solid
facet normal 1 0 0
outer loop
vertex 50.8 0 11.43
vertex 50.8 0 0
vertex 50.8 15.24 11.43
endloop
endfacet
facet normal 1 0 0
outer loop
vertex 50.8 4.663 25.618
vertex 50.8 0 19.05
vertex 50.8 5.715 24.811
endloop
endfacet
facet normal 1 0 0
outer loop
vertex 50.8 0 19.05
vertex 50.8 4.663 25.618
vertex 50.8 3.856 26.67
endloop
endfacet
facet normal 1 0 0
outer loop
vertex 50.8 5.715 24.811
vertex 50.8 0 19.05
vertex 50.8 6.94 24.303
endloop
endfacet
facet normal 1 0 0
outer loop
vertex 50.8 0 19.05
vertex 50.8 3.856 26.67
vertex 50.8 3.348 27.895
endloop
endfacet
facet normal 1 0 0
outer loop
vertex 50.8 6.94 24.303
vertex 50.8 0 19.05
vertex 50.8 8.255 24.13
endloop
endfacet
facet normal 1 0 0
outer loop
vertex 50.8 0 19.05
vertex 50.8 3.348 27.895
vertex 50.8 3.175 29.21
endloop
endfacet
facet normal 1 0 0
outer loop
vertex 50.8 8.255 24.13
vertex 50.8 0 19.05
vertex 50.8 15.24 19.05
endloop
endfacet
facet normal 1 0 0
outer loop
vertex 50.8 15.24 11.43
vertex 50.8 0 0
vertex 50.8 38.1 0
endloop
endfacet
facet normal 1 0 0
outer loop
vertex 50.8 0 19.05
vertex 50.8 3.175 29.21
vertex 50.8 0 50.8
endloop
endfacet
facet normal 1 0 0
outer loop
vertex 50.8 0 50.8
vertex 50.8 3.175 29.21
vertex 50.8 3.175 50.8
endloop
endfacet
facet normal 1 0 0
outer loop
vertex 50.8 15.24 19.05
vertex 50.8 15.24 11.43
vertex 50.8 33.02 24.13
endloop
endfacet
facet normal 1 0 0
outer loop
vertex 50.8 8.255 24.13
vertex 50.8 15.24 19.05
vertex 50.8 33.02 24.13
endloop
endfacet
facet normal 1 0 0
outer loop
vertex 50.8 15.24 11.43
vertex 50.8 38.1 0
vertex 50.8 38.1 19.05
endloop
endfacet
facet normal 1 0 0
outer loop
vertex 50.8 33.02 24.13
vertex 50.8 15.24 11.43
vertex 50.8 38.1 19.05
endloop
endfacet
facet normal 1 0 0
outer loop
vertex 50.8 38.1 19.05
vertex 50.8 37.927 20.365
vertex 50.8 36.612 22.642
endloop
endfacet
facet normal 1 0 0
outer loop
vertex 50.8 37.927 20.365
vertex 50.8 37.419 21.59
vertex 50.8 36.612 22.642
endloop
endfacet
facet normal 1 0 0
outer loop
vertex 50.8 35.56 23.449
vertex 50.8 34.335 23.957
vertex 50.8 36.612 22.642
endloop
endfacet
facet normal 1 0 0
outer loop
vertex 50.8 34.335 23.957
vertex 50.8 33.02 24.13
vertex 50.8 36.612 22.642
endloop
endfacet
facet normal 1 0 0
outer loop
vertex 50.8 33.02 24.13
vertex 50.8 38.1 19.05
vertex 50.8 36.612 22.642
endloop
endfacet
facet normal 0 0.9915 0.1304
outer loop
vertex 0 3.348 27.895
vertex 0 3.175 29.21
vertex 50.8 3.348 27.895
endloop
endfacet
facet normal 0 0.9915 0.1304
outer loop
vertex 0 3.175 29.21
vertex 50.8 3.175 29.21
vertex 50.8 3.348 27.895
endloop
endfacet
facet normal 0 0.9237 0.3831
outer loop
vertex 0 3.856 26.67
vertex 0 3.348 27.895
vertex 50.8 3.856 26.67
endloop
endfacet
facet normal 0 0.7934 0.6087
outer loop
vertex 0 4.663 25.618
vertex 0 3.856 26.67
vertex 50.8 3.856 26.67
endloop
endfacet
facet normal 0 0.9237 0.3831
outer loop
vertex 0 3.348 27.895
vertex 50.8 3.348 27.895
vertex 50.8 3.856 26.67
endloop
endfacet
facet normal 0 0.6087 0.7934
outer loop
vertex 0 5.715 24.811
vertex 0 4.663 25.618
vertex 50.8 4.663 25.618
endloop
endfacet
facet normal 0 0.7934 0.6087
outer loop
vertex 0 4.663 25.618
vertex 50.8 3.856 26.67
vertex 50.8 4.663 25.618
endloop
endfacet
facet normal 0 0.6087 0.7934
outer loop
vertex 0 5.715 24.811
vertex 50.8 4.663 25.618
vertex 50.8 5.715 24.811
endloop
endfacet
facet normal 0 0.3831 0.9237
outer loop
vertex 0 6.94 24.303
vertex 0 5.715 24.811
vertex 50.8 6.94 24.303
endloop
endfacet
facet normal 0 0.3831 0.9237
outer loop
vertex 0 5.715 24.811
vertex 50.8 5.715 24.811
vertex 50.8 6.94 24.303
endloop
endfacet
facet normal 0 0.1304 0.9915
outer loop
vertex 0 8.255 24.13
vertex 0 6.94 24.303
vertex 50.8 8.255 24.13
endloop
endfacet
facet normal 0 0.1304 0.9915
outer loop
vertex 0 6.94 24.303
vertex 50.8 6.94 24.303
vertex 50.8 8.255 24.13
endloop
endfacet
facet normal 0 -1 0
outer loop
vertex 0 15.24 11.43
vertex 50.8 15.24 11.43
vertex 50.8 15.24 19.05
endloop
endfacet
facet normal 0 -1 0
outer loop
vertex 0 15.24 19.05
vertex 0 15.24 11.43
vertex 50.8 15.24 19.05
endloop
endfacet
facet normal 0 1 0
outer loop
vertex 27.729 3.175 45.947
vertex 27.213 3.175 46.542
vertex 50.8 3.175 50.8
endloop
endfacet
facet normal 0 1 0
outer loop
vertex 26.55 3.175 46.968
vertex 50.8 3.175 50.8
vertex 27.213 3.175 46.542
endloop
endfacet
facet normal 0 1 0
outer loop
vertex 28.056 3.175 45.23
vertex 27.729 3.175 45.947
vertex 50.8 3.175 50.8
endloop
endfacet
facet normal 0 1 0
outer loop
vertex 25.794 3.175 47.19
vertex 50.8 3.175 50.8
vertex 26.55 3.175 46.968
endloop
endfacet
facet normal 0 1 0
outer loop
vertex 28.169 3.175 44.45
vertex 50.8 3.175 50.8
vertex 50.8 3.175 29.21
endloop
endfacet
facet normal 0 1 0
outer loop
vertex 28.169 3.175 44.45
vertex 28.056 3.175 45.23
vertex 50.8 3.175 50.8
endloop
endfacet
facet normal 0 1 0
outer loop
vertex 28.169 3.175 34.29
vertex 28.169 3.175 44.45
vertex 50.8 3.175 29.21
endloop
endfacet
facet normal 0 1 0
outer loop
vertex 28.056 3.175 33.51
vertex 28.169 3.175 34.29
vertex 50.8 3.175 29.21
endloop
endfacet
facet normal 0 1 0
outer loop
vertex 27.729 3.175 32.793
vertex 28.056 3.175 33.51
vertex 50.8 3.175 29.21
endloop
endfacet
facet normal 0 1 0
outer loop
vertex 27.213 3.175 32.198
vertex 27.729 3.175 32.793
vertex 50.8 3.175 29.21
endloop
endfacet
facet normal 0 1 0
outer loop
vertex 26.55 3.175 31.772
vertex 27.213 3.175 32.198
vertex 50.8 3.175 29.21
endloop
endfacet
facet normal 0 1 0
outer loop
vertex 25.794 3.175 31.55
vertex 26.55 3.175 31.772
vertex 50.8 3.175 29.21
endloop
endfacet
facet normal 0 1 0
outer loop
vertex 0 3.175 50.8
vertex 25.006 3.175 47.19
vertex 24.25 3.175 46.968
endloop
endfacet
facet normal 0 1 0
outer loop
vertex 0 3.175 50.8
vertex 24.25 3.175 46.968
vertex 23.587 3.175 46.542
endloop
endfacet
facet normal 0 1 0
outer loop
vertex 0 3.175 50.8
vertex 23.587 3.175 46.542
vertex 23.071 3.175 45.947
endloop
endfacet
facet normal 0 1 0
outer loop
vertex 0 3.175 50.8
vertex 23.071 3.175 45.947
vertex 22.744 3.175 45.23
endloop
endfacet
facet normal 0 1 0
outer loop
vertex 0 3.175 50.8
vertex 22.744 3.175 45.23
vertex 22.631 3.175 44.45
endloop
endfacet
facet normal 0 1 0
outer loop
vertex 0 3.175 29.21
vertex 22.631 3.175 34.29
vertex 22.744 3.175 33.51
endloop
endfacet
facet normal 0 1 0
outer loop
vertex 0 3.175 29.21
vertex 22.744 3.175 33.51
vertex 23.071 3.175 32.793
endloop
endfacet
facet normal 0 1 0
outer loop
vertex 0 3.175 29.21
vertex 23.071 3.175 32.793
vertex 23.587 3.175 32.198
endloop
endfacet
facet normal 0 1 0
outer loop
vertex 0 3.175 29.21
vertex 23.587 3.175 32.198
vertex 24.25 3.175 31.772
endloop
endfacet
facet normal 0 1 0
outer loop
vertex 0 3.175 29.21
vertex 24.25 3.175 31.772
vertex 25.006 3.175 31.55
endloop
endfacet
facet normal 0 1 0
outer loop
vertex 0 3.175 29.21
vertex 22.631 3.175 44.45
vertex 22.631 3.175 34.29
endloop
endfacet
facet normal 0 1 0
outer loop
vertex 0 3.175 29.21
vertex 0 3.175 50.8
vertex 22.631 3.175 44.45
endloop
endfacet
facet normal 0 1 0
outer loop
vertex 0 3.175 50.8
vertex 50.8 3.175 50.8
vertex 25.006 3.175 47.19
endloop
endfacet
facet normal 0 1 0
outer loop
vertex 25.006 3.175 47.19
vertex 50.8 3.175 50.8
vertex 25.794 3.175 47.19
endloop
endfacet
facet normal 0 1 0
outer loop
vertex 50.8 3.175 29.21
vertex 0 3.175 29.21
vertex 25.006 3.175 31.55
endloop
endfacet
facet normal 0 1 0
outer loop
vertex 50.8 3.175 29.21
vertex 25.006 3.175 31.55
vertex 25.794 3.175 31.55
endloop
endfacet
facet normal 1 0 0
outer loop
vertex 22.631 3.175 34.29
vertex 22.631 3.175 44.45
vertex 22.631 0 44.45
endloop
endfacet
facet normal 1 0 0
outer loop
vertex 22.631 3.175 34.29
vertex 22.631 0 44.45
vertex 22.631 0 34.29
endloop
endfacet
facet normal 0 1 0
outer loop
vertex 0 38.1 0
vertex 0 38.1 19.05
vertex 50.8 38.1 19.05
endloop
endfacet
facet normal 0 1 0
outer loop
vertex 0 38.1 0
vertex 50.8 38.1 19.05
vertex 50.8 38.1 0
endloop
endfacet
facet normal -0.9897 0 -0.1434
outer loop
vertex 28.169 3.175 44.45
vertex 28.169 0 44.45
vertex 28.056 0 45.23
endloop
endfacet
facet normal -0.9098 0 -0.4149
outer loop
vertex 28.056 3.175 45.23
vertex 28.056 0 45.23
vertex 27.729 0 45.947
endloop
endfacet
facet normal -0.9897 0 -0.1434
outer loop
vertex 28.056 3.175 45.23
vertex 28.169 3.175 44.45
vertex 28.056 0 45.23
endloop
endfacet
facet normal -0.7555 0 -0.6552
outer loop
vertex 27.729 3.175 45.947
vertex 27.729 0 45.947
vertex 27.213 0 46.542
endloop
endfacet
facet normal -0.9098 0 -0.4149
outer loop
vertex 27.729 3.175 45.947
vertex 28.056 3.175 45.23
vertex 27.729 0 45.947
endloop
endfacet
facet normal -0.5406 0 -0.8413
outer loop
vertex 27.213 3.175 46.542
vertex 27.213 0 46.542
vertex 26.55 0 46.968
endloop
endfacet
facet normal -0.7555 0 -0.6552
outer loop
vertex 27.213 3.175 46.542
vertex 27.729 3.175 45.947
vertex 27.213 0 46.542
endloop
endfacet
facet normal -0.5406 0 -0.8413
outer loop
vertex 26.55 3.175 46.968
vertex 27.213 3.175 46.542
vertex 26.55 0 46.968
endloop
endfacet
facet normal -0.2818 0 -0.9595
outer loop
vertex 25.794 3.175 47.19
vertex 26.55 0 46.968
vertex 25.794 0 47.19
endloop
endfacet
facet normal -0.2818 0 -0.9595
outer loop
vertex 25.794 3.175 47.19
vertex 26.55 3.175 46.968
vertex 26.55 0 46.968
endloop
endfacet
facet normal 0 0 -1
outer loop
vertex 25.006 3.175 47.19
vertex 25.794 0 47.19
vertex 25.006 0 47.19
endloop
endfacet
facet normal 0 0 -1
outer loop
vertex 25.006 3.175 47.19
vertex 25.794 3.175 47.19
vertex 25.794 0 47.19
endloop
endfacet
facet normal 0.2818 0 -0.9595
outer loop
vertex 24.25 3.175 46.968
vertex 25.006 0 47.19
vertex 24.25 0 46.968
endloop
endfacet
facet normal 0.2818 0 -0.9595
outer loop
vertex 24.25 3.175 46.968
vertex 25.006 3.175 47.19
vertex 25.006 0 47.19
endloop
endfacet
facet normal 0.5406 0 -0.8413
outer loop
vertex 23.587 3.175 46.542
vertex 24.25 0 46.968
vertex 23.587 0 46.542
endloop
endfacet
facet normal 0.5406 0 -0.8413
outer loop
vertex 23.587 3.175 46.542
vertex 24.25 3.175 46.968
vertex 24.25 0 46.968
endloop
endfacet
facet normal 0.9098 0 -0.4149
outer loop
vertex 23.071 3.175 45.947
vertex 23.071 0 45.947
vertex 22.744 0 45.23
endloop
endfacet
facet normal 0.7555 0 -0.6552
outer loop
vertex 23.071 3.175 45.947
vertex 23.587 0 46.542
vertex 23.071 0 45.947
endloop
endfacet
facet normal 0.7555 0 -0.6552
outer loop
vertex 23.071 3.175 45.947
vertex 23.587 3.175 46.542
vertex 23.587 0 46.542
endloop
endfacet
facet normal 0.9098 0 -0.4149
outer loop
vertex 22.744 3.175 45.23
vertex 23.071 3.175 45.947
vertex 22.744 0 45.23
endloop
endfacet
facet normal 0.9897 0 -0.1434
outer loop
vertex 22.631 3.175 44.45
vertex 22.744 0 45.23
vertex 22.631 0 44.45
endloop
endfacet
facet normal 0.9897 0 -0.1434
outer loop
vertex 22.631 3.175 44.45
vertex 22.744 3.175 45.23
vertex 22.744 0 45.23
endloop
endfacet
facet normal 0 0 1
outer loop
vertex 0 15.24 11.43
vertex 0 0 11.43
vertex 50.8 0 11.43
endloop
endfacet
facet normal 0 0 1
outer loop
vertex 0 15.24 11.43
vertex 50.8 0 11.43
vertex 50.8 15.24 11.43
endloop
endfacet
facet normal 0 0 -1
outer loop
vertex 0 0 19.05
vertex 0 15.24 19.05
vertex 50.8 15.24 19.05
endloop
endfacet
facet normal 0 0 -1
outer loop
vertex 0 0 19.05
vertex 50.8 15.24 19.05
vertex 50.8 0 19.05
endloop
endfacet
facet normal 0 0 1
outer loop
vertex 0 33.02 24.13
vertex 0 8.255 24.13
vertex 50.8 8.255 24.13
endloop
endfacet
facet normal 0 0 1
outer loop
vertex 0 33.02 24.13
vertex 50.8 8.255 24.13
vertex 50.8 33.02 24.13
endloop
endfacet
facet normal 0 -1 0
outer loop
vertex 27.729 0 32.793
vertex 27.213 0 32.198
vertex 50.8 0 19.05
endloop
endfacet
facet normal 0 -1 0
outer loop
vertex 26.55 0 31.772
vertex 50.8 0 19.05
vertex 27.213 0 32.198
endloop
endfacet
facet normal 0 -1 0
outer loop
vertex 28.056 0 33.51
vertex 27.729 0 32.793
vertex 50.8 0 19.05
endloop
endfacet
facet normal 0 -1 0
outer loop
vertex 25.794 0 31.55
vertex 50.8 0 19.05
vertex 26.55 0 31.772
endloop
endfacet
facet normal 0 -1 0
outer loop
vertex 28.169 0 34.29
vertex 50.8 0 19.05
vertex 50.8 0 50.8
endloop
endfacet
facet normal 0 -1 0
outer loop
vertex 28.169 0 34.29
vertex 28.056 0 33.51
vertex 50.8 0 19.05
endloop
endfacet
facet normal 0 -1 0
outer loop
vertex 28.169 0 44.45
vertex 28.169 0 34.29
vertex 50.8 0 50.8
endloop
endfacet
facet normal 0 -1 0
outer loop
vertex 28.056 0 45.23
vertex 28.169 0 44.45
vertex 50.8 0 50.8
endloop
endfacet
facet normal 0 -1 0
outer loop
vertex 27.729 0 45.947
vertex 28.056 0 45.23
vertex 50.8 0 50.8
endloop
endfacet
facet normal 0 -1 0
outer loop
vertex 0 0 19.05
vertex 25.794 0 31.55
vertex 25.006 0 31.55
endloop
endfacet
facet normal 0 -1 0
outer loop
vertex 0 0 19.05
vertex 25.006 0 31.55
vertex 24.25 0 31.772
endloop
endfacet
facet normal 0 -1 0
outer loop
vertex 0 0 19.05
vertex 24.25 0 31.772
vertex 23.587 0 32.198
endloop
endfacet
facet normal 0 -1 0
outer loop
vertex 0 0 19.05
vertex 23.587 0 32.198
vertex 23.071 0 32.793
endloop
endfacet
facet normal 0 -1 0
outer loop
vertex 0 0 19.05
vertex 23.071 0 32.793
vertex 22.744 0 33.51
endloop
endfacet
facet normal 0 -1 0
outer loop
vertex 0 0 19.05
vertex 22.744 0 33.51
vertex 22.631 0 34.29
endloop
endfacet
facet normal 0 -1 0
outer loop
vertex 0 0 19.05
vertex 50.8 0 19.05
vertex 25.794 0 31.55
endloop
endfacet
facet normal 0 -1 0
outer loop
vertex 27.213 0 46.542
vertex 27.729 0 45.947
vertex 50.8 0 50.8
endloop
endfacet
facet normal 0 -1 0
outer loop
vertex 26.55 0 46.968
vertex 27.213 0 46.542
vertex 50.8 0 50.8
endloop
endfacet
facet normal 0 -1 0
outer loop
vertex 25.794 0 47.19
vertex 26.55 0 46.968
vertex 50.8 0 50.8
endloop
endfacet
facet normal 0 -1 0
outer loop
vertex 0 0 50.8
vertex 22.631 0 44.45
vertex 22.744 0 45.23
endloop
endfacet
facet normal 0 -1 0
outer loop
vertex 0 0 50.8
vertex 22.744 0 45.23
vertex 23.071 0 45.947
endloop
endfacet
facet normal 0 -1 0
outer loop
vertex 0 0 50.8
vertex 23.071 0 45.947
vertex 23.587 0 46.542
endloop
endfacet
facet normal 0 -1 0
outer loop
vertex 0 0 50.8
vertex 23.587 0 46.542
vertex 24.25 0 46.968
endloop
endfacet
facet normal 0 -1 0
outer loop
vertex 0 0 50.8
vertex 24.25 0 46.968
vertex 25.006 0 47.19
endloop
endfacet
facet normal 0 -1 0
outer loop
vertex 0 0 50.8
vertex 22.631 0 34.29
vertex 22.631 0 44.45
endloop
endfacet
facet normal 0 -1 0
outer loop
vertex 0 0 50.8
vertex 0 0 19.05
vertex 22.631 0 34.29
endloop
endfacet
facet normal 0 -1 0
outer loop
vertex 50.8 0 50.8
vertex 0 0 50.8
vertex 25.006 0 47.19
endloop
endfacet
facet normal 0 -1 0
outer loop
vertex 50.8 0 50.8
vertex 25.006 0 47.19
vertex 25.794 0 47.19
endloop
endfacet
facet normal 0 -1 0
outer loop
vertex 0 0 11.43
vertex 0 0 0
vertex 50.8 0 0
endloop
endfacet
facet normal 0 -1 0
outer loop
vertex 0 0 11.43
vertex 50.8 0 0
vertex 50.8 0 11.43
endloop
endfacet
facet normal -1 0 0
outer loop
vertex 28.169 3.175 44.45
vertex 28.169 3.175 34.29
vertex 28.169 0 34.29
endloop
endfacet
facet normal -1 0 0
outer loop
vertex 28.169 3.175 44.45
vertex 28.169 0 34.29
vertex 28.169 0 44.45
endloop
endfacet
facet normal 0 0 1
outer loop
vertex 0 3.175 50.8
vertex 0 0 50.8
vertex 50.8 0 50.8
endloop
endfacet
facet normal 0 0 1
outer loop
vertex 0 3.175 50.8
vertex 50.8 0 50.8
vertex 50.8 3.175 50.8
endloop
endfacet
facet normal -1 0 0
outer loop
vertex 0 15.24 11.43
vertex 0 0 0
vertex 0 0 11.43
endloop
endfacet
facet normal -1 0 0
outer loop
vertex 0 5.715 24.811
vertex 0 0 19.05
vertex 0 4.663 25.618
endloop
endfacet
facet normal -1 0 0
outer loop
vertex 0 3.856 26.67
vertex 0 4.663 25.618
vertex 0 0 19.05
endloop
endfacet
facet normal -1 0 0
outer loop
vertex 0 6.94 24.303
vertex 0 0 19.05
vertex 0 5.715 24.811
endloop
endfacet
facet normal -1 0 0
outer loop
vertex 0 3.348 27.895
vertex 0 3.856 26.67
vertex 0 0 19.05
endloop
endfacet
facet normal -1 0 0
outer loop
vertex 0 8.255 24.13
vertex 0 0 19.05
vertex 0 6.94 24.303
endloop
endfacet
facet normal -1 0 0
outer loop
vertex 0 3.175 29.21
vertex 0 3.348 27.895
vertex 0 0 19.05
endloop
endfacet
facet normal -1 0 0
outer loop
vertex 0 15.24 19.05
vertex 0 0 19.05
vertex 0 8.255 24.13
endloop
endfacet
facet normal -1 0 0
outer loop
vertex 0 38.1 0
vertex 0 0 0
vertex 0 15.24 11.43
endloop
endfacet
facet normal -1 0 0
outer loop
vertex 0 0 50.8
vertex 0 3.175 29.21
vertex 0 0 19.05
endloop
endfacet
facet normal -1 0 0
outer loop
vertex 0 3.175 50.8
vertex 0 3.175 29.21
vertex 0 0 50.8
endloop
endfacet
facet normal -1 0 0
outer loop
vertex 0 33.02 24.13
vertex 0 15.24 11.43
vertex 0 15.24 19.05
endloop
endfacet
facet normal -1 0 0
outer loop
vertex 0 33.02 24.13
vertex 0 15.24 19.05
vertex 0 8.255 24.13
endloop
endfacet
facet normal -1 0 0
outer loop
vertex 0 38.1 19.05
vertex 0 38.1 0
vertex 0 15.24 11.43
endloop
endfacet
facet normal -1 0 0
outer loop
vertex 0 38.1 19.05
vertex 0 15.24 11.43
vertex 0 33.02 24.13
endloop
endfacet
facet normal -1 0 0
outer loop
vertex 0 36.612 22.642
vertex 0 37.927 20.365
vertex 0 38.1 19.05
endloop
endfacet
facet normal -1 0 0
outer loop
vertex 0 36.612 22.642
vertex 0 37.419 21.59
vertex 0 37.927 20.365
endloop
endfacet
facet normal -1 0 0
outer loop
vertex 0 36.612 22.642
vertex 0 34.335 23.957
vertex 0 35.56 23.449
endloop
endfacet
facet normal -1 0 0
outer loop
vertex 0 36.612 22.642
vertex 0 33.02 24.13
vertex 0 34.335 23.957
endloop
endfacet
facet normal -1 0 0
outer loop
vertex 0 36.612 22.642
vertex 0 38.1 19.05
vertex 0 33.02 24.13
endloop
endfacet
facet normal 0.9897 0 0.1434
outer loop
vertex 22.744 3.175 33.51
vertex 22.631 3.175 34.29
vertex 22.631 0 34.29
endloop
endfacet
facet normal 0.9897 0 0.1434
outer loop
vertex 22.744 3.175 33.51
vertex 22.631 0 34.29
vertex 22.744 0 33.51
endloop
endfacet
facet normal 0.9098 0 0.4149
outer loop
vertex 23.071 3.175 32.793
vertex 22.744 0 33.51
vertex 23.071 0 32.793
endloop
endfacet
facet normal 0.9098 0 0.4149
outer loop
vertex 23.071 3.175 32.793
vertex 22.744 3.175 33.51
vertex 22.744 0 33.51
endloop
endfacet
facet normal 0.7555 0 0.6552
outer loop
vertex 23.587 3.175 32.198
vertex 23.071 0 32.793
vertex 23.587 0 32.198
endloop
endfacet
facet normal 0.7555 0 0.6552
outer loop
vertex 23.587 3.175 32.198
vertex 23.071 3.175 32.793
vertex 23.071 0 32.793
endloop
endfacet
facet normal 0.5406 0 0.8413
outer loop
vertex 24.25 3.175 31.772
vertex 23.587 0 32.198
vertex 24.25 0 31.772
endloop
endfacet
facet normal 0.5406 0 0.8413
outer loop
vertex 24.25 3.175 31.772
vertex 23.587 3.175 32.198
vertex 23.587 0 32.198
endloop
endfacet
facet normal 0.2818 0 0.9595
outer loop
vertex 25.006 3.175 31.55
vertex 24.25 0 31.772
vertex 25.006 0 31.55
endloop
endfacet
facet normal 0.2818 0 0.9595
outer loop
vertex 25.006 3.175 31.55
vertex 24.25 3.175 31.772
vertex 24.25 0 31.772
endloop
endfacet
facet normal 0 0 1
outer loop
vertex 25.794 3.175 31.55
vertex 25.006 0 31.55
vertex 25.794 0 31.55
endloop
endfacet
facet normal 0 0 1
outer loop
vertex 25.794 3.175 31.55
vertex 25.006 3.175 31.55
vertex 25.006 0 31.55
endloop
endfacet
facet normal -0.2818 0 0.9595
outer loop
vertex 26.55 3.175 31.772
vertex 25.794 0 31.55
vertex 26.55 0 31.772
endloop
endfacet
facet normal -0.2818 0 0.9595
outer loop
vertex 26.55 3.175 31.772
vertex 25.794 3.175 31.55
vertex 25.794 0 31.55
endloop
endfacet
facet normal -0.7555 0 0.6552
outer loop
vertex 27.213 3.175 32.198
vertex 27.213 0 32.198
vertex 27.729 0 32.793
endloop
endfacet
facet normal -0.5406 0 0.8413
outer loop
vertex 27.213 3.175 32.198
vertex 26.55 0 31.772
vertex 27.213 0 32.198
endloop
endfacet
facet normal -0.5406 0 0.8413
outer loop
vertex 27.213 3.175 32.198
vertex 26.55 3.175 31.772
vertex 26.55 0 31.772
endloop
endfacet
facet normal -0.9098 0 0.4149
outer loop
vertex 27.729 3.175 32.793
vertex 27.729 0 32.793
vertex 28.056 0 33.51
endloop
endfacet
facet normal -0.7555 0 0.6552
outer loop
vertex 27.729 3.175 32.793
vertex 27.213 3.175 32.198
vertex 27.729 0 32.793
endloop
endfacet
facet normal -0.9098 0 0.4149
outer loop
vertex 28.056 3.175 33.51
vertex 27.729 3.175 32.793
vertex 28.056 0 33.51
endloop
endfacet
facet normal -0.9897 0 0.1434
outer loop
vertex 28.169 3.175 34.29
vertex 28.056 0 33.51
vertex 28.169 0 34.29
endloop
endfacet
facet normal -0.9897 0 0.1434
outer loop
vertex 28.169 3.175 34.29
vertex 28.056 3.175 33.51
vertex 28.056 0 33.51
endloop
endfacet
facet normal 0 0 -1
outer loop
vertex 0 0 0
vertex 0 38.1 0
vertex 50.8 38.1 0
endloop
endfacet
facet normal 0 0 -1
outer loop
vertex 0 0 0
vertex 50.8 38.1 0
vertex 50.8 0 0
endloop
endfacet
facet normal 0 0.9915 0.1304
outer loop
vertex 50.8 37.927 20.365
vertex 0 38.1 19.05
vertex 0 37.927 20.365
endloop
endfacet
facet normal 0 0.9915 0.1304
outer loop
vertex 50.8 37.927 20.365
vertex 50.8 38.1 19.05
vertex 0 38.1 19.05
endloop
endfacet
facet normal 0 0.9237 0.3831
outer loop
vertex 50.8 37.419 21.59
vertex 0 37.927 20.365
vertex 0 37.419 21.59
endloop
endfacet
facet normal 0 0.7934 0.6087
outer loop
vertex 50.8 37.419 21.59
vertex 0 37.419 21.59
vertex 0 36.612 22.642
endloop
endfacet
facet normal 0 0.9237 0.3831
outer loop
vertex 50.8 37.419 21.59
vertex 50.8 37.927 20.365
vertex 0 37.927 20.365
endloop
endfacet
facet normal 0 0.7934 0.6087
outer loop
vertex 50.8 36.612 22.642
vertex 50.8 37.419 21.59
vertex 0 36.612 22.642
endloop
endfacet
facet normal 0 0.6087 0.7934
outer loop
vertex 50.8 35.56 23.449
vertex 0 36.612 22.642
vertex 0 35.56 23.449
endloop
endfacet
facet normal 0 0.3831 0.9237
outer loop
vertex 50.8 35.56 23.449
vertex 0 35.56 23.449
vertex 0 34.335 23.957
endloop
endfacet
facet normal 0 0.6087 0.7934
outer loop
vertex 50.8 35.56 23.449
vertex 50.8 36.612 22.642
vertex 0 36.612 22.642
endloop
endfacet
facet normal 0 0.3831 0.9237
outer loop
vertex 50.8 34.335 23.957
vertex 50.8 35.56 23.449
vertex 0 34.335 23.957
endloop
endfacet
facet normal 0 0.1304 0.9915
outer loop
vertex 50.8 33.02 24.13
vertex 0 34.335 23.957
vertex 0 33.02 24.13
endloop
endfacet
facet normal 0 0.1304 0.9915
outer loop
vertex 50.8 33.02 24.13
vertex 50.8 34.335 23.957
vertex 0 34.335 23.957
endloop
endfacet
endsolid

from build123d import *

# Parameters (mm, degrees)
BOSS_EXTRUDE1_DEPTH = 50.8
CUT_EXTRUDE1_DEPTH  = 80.881384721
FILLET1_R           = 5.08


with BuildPart() as part:
    # Sketch1 → Boss-Extrude1 (new body)
    with BuildSketch(Plane(origin=(0, 0, 0), x_dir=(0, 0, -1), z_dir=(1, 0, 0))):
        Polygon((0, 0), (-11.43, 0), (-11.43, 15.24), (-19.05, 15.24), (-19.05, 0), (-50.8, 0), (-50.8, 3.175), (-24.13, 3.175), (-24.13, 38.1), (0, 38.1), align=None)
    extrude(amount=BOSS_EXTRUDE1_DEPTH)

    # Sketch2 → Cut-Extrude1 (cut, through all)
    with BuildSketch(Plane(origin=(0, 3.175, 0), x_dir=(1, 0, 0), z_dir=(0, 1, 0))):
        with BuildLine():
            Line((28.1686, -34.29), (28.1686, -44.45))
            ThreePointArc((28.1686, -44.45), (25.4, -47.2186), (22.6314, -44.45))
            Line((22.6314, -44.45), (22.6314, -34.29))
            ThreePointArc((22.6314, -34.29), (25.4, -31.5214), (28.1686, -34.29))
        make_face()
    extrude(amount=-CUT_EXTRUDE1_DEPTH, mode=Mode.SUBTRACT)

    # Fillet1
    fillet1_edges = [part.edges().sort_by_distance(p)[0] for p in [
        (25.4, 3.175, 24.13),
        (25.4, 38.1, 24.13),
    ]]
    fillet(fillet1_edges, radius=FILLET1_R)


solid = part.part
